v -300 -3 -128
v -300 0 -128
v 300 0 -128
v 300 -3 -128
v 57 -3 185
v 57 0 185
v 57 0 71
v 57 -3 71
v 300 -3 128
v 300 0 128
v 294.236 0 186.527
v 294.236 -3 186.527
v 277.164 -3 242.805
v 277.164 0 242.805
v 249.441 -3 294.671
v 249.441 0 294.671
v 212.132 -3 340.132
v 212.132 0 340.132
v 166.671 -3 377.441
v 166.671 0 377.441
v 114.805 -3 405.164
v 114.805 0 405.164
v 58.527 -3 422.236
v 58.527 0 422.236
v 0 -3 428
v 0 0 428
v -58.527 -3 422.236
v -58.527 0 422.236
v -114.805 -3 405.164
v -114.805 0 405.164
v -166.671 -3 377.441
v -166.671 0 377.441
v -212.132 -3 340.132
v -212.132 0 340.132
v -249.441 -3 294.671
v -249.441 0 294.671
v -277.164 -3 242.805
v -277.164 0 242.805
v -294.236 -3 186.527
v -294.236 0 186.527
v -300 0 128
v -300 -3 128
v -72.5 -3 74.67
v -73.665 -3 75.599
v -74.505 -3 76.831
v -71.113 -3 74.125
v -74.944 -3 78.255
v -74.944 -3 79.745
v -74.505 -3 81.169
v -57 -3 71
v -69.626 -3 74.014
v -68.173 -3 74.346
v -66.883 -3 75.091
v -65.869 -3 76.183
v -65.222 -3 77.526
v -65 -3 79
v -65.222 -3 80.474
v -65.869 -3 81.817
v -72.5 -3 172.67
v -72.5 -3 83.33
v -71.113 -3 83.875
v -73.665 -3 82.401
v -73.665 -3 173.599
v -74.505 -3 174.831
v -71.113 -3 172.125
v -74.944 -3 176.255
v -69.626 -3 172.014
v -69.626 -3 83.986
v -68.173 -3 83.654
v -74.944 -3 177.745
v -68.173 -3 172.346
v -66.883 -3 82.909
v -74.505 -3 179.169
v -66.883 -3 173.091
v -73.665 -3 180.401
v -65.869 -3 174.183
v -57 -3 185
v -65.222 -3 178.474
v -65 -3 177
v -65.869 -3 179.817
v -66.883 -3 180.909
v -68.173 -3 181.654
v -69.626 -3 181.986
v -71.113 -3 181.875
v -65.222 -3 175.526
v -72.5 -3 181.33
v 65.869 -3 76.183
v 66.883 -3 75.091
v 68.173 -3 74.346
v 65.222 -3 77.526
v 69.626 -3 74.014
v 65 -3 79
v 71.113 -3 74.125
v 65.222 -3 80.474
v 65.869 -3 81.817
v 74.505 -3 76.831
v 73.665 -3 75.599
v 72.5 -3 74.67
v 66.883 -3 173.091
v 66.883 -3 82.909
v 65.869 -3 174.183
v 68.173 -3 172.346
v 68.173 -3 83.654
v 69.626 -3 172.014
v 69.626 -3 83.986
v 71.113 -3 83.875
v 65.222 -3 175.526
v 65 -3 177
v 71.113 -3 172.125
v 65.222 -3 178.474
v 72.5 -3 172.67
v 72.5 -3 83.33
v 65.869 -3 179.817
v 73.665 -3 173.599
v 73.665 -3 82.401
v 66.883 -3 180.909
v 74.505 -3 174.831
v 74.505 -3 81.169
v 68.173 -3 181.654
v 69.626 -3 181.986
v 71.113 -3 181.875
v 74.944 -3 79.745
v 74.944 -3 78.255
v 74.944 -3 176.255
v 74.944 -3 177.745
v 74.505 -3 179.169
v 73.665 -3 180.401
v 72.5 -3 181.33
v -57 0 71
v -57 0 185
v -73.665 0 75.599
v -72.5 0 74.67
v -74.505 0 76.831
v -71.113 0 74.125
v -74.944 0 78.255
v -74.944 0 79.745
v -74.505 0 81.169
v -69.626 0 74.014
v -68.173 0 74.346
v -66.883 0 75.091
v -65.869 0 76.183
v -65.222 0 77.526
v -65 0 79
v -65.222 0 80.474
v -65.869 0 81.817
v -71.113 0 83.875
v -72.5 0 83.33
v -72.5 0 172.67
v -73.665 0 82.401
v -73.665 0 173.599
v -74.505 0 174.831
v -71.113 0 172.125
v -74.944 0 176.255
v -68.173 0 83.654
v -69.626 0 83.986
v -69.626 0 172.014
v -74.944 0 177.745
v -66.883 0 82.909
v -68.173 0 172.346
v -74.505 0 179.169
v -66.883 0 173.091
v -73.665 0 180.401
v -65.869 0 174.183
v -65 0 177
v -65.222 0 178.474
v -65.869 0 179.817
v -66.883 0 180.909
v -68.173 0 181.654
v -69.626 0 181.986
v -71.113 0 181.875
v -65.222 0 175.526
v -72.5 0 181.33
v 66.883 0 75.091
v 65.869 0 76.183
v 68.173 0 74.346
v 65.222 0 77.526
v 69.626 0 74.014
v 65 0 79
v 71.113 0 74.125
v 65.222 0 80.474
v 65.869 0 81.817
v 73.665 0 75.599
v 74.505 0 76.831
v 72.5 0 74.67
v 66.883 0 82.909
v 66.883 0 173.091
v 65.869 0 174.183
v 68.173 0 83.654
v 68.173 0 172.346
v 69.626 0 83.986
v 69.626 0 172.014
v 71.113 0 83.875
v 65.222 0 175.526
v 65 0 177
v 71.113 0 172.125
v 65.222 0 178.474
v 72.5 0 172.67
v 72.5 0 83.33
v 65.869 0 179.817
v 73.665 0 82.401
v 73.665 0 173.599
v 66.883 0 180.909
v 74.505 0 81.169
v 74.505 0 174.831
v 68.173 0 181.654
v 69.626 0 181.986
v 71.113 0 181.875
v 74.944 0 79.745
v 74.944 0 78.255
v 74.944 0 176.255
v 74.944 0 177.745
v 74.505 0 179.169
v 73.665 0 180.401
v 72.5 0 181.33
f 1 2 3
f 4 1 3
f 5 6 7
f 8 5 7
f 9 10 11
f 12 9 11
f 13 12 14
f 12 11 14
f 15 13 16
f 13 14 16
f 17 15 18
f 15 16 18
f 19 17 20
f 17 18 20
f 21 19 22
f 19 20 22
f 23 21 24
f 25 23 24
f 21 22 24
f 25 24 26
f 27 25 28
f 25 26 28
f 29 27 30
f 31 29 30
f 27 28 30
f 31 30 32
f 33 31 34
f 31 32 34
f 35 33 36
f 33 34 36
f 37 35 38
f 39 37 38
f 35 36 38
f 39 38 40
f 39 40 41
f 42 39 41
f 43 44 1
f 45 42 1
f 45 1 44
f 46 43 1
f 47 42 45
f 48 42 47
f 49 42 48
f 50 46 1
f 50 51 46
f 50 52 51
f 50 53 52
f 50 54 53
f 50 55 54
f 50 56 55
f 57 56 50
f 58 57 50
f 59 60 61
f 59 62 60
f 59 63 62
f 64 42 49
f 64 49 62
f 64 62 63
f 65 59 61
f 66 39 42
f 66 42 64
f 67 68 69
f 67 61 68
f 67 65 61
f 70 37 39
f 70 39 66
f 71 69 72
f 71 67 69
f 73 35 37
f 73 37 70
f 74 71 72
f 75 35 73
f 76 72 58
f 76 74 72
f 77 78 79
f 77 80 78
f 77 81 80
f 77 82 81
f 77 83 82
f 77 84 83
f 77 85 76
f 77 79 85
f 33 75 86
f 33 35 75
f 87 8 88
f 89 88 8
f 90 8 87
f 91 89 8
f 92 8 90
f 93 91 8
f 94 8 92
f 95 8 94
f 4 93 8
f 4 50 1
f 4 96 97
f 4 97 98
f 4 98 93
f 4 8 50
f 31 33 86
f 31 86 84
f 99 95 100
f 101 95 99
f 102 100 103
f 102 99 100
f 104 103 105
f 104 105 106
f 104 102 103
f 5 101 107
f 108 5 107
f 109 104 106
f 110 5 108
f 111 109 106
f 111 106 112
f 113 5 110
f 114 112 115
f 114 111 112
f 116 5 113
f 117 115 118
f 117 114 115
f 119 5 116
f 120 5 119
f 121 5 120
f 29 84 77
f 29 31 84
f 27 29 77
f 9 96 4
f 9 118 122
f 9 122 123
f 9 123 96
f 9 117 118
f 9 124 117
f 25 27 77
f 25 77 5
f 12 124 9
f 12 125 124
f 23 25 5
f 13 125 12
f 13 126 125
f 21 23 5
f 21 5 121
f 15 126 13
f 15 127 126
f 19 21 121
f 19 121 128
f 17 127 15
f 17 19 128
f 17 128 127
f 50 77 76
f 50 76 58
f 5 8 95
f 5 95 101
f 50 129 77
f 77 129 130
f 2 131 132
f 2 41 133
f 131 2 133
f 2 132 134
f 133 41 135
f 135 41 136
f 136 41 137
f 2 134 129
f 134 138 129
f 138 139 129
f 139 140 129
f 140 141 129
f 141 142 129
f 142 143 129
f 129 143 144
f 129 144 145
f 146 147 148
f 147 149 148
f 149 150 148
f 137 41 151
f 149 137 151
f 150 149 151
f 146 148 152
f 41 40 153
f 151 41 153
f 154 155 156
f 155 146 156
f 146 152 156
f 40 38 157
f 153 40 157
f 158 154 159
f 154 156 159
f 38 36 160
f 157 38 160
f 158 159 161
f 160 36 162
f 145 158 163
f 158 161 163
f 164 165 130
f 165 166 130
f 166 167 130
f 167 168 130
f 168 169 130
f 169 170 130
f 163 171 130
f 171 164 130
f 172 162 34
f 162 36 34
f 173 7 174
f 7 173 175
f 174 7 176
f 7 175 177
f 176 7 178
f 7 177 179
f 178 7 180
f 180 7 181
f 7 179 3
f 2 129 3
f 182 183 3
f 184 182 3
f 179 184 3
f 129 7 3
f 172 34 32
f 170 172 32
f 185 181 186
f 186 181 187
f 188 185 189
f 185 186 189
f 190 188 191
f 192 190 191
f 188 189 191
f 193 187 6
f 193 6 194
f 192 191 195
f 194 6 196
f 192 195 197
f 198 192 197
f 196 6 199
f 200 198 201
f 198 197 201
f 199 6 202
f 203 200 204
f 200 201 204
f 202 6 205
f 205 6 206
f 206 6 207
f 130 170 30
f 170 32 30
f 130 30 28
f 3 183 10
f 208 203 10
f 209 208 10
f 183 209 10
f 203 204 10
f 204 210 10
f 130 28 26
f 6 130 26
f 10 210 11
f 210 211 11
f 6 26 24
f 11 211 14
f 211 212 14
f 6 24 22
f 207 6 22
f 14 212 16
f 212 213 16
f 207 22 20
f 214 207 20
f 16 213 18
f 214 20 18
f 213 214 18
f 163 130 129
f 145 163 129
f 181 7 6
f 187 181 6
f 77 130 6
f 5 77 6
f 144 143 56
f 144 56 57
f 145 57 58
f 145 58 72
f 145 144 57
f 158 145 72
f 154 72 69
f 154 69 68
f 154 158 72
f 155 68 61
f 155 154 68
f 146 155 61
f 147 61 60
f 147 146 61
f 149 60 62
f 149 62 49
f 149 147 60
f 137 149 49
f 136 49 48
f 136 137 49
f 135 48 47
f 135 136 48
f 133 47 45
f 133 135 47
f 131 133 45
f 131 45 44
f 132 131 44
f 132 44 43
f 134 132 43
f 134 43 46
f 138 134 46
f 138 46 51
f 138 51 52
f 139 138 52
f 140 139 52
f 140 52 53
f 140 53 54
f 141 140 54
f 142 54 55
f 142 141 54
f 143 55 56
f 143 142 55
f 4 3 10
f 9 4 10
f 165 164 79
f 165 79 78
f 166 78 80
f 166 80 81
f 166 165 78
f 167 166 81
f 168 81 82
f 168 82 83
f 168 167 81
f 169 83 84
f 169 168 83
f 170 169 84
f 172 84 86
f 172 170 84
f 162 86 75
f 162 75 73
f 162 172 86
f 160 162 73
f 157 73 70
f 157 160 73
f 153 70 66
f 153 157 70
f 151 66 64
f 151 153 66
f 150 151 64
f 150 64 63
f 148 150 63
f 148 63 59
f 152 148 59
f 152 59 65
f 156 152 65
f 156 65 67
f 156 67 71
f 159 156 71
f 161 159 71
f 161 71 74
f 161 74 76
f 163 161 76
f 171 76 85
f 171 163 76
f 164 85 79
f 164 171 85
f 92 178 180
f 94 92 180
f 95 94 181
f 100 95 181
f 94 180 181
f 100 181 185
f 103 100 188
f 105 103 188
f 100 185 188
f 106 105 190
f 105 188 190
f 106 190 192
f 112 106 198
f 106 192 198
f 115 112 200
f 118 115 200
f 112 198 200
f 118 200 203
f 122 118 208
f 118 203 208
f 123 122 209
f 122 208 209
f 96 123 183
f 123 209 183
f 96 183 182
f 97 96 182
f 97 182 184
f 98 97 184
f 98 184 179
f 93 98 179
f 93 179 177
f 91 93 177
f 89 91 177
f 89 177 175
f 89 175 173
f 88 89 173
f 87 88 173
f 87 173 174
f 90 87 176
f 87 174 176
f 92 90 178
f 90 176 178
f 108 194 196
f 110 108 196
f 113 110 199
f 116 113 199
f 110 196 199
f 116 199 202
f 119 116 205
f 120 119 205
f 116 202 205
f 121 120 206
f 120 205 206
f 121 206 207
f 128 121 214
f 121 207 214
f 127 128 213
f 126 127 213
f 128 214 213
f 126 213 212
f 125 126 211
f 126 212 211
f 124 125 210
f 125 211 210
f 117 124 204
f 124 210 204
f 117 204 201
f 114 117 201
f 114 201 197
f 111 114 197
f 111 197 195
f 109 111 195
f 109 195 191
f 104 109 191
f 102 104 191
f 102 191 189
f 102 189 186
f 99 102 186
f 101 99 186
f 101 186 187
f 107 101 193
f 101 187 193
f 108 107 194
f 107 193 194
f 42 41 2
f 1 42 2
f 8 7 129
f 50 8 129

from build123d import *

# Parameters (mm, degrees)
F0_R     = 5
F1_DEPTH = 3


with BuildPart() as f1:
    # F0 (on Front) → F1 (new body)
    with BuildSketch(Plane.XZ):
        with BuildLine():
            ThreePointArc((75, 79), (70, 84), (65, 79))
            ThreePointArc((65, 79), (70, 74), (75, 79))
        make_face()
        with Locations((-70, 79)):
            Circle(F0_R)
        Polygon((-300, 128), (-300, -128), (300, -128), (300, 128), (57, 128), (57, 79), (57, 71), (-57, 71), (-57, 79), (-57, 128), align=None)
        with Locations((-70, 79)):
            Circle(F0_R, mode=Mode.SUBTRACT)
        with BuildLine():
            ThreePointArc((75, 79), (70, 74), (65, 79))
            ThreePointArc((65, 79), (70, 84), (75, 79))
        make_face(mode=Mode.SUBTRACT)
        with Locations((-70, 177)):
            Circle(F0_R)
        with BuildLine():
            ThreePointArc((75, 177), (70, 182), (65, 177))
            ThreePointArc((65, 177), (70, 172), (75, 177))
        make_face()
        with BuildLine():
            ThreePointArc((300, 128), (0, 428), (-300, 128))
            Line((-300, 128), (-57, 128))
            Line((-57, 128), (-57, 177))
            Line((-57, 177), (-57, 185))
            Line((-57, 185), (57, 185))
            Line((57, 185), (57, 177))
            Line((57, 177), (57, 128))
            Line((57, 128), (300, 128))
        make_face()
        with Locations((-70, 177)):
            Circle(F0_R, mode=Mode.SUBTRACT)
        with BuildLine():
            ThreePointArc((75, 177), (70, 172), (65, 177))
            ThreePointArc((65, 177), (70, 182), (75, 177))
        make_face(mode=Mode.SUBTRACT)
    extrude(amount=F1_DEPTH)


solid = f1.part
